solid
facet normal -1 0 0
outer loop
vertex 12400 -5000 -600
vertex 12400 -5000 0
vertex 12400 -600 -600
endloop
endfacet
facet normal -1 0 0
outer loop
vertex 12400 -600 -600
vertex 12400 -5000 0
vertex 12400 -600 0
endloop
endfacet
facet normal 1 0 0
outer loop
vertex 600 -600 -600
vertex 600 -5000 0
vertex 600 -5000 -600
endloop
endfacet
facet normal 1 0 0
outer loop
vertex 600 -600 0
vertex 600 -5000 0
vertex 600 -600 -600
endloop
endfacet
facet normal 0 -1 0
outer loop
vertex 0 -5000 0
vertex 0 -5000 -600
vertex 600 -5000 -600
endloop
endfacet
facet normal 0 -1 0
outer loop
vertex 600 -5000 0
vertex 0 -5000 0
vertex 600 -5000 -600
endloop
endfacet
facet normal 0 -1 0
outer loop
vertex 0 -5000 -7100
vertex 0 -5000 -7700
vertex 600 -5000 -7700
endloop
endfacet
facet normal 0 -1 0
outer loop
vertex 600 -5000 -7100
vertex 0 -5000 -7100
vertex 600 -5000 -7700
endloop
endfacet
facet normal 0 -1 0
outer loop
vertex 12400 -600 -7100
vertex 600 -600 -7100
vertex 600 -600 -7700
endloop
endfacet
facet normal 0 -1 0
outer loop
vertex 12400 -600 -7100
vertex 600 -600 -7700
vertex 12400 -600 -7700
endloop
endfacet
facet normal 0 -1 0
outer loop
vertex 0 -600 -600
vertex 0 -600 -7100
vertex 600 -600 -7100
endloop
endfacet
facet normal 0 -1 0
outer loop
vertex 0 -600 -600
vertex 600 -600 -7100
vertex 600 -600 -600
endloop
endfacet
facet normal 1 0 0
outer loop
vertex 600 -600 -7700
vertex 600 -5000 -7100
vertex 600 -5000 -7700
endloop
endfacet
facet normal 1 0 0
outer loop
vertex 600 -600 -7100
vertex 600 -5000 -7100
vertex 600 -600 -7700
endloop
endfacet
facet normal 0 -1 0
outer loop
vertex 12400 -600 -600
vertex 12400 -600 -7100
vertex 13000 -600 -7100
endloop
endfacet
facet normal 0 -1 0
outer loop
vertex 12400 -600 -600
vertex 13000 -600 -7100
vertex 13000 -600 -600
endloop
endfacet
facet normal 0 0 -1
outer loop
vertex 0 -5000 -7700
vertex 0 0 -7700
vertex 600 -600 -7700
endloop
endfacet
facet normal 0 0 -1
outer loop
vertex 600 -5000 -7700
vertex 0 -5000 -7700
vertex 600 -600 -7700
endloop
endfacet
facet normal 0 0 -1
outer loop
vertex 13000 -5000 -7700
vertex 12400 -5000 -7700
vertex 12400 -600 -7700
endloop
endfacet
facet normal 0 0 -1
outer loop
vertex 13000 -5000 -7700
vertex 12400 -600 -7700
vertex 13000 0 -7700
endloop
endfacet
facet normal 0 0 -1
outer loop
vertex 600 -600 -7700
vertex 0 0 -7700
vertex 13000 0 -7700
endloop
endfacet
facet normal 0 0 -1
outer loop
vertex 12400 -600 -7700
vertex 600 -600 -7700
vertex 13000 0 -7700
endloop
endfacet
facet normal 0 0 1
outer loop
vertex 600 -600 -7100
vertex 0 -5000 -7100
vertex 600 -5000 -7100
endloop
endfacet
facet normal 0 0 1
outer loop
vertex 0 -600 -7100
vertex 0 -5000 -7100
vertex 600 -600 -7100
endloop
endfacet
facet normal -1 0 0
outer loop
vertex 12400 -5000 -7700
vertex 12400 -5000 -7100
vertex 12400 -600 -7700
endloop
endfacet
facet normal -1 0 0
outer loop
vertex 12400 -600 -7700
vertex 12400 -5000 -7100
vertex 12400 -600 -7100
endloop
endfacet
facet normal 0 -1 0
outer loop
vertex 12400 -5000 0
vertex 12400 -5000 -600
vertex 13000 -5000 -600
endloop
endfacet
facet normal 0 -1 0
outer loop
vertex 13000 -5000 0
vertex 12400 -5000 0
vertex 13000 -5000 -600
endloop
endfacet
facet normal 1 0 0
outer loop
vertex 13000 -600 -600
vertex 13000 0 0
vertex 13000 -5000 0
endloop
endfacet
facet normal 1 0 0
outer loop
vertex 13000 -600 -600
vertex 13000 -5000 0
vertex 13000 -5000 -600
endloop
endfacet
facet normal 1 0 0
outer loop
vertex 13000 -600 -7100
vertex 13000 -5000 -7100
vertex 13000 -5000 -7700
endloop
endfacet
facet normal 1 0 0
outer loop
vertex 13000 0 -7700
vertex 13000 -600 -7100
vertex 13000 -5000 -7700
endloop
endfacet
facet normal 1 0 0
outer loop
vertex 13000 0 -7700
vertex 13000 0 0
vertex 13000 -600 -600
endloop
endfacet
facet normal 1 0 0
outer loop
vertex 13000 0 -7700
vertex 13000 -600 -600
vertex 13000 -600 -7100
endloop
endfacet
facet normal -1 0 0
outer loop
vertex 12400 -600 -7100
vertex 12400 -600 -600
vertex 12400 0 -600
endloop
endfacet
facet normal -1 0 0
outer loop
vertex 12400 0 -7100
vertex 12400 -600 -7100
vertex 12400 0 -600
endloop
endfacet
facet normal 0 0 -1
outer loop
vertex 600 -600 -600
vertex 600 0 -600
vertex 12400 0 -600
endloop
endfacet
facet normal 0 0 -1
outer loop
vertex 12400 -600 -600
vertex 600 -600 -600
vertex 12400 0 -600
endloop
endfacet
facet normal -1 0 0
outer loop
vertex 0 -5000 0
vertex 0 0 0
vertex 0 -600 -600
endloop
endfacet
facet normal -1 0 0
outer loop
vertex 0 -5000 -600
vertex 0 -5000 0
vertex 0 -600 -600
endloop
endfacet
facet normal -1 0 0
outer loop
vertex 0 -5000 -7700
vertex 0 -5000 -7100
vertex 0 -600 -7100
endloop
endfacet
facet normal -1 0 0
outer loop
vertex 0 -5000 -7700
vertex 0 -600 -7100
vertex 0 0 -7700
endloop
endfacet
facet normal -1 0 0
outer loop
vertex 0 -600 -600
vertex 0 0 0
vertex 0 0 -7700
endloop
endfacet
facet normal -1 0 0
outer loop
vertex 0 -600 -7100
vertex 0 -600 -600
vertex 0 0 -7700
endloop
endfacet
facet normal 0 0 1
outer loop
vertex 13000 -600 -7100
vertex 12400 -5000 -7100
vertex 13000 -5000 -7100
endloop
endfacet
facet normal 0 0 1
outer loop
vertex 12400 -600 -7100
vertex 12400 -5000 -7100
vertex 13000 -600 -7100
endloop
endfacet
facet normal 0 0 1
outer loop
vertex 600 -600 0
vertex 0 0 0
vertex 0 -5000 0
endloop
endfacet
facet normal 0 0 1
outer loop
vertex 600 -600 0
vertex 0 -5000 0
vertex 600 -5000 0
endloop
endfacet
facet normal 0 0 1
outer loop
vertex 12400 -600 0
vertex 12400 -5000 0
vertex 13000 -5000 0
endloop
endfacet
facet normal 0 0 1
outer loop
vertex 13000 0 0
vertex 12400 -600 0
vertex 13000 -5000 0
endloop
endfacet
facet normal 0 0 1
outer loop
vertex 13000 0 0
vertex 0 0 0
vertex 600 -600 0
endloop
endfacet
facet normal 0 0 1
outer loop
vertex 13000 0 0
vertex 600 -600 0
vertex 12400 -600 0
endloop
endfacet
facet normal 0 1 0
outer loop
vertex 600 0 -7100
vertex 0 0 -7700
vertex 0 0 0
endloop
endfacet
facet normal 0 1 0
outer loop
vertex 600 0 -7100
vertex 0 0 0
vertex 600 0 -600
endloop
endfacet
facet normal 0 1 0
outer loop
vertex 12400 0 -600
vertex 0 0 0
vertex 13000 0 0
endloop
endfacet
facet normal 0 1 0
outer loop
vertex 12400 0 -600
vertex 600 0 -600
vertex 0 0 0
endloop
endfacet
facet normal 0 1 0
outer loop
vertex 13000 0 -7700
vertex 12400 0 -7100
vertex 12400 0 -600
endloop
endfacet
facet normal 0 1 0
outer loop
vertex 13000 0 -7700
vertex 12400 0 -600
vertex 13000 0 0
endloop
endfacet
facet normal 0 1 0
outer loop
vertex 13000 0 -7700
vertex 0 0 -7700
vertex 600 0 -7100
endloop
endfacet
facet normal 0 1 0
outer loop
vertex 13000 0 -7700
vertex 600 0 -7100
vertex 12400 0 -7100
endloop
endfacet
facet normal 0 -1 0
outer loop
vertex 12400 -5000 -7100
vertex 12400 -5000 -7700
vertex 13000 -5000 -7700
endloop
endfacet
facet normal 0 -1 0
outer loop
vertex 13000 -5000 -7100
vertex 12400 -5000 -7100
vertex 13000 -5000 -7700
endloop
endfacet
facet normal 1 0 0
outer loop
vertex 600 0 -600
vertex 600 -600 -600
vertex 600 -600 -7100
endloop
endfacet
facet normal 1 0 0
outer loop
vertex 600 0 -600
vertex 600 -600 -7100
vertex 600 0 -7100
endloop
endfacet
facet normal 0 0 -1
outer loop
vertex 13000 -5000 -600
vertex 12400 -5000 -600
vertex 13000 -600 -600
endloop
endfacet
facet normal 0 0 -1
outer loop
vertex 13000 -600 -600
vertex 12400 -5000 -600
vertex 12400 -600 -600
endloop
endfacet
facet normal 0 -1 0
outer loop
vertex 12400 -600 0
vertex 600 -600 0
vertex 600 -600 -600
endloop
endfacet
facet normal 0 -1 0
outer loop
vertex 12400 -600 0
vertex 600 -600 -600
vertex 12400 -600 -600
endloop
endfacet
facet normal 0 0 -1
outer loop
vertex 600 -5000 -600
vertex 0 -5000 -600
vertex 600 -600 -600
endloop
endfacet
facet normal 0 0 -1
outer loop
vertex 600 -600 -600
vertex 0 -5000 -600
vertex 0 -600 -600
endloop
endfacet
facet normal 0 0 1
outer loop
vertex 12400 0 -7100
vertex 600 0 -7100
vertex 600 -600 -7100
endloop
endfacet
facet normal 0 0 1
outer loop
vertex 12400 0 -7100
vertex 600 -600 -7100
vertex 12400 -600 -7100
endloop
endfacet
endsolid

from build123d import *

# Parameters (mm, degrees)
ESQUISSE2_W             = 13000
ESQUISSE2_H             = 7700
BOSS_EXTRU_1_DEPTH      = 5000
ESQUISSE6_W             = 11800
ESQUISSE6_H             = 6500
ENL_V_MAT_EXTRU_2_DEPTH = 5000
ESQUISSE7_W             = 11800
ESQUISSE7_H             = 4400
ENL_V_MAT_EXTRU_3_DEPTH = 15916.087181665
ESQUISSE10_W            = 6500
ESQUISSE10_H            = 4400
ENL_V_MAT_EXTRU_4_DEPTH = 15916.087181665


with BuildPart() as part:
    # Esquisse2 → Boss.-Extru.1 (new body)
    with BuildSketch(Plane(origin=(0, 0, 0), x_dir=(1, 0, 0), z_dir=(0, 1, 0))):
        with Locations((6500, 3850)):
            Rectangle(ESQUISSE2_W, ESQUISSE2_H)
    extrude(amount=-BOSS_EXTRU_1_DEPTH)

    # Esquisse6 → Enlèv. mat.-Extru.2 (cut)
    with BuildSketch(Plane(origin=(0, 0, 0), x_dir=(1, 0, 0), z_dir=(0, 1, 0))):
        with Locations((6500, 3850)):
            Rectangle(ESQUISSE6_W, ESQUISSE6_H)
    extrude(amount=-ENL_V_MAT_EXTRU_2_DEPTH, mode=Mode.SUBTRACT)

    # Esquisse7 → Enlèv. mat.-Extru.3 (cut, through all)
    with BuildSketch(Plane.XY):
        with Locations((6500, -2800)):
            Rectangle(ESQUISSE7_W, ESQUISSE7_H)
    extrude(amount=-ENL_V_MAT_EXTRU_3_DEPTH, mode=Mode.SUBTRACT)

    # Esquisse10 → Enlèv. mat.-Extru.4 (cut, through all)
    with BuildSketch(Plane.ZY):
        with Locations((-3850, -2800)):
            Rectangle(ESQUISSE10_W, ESQUISSE10_H)
    extrude(amount=-ENL_V_MAT_EXTRU_4_DEPTH, mode=Mode.SUBTRACT)


solid = part.part
